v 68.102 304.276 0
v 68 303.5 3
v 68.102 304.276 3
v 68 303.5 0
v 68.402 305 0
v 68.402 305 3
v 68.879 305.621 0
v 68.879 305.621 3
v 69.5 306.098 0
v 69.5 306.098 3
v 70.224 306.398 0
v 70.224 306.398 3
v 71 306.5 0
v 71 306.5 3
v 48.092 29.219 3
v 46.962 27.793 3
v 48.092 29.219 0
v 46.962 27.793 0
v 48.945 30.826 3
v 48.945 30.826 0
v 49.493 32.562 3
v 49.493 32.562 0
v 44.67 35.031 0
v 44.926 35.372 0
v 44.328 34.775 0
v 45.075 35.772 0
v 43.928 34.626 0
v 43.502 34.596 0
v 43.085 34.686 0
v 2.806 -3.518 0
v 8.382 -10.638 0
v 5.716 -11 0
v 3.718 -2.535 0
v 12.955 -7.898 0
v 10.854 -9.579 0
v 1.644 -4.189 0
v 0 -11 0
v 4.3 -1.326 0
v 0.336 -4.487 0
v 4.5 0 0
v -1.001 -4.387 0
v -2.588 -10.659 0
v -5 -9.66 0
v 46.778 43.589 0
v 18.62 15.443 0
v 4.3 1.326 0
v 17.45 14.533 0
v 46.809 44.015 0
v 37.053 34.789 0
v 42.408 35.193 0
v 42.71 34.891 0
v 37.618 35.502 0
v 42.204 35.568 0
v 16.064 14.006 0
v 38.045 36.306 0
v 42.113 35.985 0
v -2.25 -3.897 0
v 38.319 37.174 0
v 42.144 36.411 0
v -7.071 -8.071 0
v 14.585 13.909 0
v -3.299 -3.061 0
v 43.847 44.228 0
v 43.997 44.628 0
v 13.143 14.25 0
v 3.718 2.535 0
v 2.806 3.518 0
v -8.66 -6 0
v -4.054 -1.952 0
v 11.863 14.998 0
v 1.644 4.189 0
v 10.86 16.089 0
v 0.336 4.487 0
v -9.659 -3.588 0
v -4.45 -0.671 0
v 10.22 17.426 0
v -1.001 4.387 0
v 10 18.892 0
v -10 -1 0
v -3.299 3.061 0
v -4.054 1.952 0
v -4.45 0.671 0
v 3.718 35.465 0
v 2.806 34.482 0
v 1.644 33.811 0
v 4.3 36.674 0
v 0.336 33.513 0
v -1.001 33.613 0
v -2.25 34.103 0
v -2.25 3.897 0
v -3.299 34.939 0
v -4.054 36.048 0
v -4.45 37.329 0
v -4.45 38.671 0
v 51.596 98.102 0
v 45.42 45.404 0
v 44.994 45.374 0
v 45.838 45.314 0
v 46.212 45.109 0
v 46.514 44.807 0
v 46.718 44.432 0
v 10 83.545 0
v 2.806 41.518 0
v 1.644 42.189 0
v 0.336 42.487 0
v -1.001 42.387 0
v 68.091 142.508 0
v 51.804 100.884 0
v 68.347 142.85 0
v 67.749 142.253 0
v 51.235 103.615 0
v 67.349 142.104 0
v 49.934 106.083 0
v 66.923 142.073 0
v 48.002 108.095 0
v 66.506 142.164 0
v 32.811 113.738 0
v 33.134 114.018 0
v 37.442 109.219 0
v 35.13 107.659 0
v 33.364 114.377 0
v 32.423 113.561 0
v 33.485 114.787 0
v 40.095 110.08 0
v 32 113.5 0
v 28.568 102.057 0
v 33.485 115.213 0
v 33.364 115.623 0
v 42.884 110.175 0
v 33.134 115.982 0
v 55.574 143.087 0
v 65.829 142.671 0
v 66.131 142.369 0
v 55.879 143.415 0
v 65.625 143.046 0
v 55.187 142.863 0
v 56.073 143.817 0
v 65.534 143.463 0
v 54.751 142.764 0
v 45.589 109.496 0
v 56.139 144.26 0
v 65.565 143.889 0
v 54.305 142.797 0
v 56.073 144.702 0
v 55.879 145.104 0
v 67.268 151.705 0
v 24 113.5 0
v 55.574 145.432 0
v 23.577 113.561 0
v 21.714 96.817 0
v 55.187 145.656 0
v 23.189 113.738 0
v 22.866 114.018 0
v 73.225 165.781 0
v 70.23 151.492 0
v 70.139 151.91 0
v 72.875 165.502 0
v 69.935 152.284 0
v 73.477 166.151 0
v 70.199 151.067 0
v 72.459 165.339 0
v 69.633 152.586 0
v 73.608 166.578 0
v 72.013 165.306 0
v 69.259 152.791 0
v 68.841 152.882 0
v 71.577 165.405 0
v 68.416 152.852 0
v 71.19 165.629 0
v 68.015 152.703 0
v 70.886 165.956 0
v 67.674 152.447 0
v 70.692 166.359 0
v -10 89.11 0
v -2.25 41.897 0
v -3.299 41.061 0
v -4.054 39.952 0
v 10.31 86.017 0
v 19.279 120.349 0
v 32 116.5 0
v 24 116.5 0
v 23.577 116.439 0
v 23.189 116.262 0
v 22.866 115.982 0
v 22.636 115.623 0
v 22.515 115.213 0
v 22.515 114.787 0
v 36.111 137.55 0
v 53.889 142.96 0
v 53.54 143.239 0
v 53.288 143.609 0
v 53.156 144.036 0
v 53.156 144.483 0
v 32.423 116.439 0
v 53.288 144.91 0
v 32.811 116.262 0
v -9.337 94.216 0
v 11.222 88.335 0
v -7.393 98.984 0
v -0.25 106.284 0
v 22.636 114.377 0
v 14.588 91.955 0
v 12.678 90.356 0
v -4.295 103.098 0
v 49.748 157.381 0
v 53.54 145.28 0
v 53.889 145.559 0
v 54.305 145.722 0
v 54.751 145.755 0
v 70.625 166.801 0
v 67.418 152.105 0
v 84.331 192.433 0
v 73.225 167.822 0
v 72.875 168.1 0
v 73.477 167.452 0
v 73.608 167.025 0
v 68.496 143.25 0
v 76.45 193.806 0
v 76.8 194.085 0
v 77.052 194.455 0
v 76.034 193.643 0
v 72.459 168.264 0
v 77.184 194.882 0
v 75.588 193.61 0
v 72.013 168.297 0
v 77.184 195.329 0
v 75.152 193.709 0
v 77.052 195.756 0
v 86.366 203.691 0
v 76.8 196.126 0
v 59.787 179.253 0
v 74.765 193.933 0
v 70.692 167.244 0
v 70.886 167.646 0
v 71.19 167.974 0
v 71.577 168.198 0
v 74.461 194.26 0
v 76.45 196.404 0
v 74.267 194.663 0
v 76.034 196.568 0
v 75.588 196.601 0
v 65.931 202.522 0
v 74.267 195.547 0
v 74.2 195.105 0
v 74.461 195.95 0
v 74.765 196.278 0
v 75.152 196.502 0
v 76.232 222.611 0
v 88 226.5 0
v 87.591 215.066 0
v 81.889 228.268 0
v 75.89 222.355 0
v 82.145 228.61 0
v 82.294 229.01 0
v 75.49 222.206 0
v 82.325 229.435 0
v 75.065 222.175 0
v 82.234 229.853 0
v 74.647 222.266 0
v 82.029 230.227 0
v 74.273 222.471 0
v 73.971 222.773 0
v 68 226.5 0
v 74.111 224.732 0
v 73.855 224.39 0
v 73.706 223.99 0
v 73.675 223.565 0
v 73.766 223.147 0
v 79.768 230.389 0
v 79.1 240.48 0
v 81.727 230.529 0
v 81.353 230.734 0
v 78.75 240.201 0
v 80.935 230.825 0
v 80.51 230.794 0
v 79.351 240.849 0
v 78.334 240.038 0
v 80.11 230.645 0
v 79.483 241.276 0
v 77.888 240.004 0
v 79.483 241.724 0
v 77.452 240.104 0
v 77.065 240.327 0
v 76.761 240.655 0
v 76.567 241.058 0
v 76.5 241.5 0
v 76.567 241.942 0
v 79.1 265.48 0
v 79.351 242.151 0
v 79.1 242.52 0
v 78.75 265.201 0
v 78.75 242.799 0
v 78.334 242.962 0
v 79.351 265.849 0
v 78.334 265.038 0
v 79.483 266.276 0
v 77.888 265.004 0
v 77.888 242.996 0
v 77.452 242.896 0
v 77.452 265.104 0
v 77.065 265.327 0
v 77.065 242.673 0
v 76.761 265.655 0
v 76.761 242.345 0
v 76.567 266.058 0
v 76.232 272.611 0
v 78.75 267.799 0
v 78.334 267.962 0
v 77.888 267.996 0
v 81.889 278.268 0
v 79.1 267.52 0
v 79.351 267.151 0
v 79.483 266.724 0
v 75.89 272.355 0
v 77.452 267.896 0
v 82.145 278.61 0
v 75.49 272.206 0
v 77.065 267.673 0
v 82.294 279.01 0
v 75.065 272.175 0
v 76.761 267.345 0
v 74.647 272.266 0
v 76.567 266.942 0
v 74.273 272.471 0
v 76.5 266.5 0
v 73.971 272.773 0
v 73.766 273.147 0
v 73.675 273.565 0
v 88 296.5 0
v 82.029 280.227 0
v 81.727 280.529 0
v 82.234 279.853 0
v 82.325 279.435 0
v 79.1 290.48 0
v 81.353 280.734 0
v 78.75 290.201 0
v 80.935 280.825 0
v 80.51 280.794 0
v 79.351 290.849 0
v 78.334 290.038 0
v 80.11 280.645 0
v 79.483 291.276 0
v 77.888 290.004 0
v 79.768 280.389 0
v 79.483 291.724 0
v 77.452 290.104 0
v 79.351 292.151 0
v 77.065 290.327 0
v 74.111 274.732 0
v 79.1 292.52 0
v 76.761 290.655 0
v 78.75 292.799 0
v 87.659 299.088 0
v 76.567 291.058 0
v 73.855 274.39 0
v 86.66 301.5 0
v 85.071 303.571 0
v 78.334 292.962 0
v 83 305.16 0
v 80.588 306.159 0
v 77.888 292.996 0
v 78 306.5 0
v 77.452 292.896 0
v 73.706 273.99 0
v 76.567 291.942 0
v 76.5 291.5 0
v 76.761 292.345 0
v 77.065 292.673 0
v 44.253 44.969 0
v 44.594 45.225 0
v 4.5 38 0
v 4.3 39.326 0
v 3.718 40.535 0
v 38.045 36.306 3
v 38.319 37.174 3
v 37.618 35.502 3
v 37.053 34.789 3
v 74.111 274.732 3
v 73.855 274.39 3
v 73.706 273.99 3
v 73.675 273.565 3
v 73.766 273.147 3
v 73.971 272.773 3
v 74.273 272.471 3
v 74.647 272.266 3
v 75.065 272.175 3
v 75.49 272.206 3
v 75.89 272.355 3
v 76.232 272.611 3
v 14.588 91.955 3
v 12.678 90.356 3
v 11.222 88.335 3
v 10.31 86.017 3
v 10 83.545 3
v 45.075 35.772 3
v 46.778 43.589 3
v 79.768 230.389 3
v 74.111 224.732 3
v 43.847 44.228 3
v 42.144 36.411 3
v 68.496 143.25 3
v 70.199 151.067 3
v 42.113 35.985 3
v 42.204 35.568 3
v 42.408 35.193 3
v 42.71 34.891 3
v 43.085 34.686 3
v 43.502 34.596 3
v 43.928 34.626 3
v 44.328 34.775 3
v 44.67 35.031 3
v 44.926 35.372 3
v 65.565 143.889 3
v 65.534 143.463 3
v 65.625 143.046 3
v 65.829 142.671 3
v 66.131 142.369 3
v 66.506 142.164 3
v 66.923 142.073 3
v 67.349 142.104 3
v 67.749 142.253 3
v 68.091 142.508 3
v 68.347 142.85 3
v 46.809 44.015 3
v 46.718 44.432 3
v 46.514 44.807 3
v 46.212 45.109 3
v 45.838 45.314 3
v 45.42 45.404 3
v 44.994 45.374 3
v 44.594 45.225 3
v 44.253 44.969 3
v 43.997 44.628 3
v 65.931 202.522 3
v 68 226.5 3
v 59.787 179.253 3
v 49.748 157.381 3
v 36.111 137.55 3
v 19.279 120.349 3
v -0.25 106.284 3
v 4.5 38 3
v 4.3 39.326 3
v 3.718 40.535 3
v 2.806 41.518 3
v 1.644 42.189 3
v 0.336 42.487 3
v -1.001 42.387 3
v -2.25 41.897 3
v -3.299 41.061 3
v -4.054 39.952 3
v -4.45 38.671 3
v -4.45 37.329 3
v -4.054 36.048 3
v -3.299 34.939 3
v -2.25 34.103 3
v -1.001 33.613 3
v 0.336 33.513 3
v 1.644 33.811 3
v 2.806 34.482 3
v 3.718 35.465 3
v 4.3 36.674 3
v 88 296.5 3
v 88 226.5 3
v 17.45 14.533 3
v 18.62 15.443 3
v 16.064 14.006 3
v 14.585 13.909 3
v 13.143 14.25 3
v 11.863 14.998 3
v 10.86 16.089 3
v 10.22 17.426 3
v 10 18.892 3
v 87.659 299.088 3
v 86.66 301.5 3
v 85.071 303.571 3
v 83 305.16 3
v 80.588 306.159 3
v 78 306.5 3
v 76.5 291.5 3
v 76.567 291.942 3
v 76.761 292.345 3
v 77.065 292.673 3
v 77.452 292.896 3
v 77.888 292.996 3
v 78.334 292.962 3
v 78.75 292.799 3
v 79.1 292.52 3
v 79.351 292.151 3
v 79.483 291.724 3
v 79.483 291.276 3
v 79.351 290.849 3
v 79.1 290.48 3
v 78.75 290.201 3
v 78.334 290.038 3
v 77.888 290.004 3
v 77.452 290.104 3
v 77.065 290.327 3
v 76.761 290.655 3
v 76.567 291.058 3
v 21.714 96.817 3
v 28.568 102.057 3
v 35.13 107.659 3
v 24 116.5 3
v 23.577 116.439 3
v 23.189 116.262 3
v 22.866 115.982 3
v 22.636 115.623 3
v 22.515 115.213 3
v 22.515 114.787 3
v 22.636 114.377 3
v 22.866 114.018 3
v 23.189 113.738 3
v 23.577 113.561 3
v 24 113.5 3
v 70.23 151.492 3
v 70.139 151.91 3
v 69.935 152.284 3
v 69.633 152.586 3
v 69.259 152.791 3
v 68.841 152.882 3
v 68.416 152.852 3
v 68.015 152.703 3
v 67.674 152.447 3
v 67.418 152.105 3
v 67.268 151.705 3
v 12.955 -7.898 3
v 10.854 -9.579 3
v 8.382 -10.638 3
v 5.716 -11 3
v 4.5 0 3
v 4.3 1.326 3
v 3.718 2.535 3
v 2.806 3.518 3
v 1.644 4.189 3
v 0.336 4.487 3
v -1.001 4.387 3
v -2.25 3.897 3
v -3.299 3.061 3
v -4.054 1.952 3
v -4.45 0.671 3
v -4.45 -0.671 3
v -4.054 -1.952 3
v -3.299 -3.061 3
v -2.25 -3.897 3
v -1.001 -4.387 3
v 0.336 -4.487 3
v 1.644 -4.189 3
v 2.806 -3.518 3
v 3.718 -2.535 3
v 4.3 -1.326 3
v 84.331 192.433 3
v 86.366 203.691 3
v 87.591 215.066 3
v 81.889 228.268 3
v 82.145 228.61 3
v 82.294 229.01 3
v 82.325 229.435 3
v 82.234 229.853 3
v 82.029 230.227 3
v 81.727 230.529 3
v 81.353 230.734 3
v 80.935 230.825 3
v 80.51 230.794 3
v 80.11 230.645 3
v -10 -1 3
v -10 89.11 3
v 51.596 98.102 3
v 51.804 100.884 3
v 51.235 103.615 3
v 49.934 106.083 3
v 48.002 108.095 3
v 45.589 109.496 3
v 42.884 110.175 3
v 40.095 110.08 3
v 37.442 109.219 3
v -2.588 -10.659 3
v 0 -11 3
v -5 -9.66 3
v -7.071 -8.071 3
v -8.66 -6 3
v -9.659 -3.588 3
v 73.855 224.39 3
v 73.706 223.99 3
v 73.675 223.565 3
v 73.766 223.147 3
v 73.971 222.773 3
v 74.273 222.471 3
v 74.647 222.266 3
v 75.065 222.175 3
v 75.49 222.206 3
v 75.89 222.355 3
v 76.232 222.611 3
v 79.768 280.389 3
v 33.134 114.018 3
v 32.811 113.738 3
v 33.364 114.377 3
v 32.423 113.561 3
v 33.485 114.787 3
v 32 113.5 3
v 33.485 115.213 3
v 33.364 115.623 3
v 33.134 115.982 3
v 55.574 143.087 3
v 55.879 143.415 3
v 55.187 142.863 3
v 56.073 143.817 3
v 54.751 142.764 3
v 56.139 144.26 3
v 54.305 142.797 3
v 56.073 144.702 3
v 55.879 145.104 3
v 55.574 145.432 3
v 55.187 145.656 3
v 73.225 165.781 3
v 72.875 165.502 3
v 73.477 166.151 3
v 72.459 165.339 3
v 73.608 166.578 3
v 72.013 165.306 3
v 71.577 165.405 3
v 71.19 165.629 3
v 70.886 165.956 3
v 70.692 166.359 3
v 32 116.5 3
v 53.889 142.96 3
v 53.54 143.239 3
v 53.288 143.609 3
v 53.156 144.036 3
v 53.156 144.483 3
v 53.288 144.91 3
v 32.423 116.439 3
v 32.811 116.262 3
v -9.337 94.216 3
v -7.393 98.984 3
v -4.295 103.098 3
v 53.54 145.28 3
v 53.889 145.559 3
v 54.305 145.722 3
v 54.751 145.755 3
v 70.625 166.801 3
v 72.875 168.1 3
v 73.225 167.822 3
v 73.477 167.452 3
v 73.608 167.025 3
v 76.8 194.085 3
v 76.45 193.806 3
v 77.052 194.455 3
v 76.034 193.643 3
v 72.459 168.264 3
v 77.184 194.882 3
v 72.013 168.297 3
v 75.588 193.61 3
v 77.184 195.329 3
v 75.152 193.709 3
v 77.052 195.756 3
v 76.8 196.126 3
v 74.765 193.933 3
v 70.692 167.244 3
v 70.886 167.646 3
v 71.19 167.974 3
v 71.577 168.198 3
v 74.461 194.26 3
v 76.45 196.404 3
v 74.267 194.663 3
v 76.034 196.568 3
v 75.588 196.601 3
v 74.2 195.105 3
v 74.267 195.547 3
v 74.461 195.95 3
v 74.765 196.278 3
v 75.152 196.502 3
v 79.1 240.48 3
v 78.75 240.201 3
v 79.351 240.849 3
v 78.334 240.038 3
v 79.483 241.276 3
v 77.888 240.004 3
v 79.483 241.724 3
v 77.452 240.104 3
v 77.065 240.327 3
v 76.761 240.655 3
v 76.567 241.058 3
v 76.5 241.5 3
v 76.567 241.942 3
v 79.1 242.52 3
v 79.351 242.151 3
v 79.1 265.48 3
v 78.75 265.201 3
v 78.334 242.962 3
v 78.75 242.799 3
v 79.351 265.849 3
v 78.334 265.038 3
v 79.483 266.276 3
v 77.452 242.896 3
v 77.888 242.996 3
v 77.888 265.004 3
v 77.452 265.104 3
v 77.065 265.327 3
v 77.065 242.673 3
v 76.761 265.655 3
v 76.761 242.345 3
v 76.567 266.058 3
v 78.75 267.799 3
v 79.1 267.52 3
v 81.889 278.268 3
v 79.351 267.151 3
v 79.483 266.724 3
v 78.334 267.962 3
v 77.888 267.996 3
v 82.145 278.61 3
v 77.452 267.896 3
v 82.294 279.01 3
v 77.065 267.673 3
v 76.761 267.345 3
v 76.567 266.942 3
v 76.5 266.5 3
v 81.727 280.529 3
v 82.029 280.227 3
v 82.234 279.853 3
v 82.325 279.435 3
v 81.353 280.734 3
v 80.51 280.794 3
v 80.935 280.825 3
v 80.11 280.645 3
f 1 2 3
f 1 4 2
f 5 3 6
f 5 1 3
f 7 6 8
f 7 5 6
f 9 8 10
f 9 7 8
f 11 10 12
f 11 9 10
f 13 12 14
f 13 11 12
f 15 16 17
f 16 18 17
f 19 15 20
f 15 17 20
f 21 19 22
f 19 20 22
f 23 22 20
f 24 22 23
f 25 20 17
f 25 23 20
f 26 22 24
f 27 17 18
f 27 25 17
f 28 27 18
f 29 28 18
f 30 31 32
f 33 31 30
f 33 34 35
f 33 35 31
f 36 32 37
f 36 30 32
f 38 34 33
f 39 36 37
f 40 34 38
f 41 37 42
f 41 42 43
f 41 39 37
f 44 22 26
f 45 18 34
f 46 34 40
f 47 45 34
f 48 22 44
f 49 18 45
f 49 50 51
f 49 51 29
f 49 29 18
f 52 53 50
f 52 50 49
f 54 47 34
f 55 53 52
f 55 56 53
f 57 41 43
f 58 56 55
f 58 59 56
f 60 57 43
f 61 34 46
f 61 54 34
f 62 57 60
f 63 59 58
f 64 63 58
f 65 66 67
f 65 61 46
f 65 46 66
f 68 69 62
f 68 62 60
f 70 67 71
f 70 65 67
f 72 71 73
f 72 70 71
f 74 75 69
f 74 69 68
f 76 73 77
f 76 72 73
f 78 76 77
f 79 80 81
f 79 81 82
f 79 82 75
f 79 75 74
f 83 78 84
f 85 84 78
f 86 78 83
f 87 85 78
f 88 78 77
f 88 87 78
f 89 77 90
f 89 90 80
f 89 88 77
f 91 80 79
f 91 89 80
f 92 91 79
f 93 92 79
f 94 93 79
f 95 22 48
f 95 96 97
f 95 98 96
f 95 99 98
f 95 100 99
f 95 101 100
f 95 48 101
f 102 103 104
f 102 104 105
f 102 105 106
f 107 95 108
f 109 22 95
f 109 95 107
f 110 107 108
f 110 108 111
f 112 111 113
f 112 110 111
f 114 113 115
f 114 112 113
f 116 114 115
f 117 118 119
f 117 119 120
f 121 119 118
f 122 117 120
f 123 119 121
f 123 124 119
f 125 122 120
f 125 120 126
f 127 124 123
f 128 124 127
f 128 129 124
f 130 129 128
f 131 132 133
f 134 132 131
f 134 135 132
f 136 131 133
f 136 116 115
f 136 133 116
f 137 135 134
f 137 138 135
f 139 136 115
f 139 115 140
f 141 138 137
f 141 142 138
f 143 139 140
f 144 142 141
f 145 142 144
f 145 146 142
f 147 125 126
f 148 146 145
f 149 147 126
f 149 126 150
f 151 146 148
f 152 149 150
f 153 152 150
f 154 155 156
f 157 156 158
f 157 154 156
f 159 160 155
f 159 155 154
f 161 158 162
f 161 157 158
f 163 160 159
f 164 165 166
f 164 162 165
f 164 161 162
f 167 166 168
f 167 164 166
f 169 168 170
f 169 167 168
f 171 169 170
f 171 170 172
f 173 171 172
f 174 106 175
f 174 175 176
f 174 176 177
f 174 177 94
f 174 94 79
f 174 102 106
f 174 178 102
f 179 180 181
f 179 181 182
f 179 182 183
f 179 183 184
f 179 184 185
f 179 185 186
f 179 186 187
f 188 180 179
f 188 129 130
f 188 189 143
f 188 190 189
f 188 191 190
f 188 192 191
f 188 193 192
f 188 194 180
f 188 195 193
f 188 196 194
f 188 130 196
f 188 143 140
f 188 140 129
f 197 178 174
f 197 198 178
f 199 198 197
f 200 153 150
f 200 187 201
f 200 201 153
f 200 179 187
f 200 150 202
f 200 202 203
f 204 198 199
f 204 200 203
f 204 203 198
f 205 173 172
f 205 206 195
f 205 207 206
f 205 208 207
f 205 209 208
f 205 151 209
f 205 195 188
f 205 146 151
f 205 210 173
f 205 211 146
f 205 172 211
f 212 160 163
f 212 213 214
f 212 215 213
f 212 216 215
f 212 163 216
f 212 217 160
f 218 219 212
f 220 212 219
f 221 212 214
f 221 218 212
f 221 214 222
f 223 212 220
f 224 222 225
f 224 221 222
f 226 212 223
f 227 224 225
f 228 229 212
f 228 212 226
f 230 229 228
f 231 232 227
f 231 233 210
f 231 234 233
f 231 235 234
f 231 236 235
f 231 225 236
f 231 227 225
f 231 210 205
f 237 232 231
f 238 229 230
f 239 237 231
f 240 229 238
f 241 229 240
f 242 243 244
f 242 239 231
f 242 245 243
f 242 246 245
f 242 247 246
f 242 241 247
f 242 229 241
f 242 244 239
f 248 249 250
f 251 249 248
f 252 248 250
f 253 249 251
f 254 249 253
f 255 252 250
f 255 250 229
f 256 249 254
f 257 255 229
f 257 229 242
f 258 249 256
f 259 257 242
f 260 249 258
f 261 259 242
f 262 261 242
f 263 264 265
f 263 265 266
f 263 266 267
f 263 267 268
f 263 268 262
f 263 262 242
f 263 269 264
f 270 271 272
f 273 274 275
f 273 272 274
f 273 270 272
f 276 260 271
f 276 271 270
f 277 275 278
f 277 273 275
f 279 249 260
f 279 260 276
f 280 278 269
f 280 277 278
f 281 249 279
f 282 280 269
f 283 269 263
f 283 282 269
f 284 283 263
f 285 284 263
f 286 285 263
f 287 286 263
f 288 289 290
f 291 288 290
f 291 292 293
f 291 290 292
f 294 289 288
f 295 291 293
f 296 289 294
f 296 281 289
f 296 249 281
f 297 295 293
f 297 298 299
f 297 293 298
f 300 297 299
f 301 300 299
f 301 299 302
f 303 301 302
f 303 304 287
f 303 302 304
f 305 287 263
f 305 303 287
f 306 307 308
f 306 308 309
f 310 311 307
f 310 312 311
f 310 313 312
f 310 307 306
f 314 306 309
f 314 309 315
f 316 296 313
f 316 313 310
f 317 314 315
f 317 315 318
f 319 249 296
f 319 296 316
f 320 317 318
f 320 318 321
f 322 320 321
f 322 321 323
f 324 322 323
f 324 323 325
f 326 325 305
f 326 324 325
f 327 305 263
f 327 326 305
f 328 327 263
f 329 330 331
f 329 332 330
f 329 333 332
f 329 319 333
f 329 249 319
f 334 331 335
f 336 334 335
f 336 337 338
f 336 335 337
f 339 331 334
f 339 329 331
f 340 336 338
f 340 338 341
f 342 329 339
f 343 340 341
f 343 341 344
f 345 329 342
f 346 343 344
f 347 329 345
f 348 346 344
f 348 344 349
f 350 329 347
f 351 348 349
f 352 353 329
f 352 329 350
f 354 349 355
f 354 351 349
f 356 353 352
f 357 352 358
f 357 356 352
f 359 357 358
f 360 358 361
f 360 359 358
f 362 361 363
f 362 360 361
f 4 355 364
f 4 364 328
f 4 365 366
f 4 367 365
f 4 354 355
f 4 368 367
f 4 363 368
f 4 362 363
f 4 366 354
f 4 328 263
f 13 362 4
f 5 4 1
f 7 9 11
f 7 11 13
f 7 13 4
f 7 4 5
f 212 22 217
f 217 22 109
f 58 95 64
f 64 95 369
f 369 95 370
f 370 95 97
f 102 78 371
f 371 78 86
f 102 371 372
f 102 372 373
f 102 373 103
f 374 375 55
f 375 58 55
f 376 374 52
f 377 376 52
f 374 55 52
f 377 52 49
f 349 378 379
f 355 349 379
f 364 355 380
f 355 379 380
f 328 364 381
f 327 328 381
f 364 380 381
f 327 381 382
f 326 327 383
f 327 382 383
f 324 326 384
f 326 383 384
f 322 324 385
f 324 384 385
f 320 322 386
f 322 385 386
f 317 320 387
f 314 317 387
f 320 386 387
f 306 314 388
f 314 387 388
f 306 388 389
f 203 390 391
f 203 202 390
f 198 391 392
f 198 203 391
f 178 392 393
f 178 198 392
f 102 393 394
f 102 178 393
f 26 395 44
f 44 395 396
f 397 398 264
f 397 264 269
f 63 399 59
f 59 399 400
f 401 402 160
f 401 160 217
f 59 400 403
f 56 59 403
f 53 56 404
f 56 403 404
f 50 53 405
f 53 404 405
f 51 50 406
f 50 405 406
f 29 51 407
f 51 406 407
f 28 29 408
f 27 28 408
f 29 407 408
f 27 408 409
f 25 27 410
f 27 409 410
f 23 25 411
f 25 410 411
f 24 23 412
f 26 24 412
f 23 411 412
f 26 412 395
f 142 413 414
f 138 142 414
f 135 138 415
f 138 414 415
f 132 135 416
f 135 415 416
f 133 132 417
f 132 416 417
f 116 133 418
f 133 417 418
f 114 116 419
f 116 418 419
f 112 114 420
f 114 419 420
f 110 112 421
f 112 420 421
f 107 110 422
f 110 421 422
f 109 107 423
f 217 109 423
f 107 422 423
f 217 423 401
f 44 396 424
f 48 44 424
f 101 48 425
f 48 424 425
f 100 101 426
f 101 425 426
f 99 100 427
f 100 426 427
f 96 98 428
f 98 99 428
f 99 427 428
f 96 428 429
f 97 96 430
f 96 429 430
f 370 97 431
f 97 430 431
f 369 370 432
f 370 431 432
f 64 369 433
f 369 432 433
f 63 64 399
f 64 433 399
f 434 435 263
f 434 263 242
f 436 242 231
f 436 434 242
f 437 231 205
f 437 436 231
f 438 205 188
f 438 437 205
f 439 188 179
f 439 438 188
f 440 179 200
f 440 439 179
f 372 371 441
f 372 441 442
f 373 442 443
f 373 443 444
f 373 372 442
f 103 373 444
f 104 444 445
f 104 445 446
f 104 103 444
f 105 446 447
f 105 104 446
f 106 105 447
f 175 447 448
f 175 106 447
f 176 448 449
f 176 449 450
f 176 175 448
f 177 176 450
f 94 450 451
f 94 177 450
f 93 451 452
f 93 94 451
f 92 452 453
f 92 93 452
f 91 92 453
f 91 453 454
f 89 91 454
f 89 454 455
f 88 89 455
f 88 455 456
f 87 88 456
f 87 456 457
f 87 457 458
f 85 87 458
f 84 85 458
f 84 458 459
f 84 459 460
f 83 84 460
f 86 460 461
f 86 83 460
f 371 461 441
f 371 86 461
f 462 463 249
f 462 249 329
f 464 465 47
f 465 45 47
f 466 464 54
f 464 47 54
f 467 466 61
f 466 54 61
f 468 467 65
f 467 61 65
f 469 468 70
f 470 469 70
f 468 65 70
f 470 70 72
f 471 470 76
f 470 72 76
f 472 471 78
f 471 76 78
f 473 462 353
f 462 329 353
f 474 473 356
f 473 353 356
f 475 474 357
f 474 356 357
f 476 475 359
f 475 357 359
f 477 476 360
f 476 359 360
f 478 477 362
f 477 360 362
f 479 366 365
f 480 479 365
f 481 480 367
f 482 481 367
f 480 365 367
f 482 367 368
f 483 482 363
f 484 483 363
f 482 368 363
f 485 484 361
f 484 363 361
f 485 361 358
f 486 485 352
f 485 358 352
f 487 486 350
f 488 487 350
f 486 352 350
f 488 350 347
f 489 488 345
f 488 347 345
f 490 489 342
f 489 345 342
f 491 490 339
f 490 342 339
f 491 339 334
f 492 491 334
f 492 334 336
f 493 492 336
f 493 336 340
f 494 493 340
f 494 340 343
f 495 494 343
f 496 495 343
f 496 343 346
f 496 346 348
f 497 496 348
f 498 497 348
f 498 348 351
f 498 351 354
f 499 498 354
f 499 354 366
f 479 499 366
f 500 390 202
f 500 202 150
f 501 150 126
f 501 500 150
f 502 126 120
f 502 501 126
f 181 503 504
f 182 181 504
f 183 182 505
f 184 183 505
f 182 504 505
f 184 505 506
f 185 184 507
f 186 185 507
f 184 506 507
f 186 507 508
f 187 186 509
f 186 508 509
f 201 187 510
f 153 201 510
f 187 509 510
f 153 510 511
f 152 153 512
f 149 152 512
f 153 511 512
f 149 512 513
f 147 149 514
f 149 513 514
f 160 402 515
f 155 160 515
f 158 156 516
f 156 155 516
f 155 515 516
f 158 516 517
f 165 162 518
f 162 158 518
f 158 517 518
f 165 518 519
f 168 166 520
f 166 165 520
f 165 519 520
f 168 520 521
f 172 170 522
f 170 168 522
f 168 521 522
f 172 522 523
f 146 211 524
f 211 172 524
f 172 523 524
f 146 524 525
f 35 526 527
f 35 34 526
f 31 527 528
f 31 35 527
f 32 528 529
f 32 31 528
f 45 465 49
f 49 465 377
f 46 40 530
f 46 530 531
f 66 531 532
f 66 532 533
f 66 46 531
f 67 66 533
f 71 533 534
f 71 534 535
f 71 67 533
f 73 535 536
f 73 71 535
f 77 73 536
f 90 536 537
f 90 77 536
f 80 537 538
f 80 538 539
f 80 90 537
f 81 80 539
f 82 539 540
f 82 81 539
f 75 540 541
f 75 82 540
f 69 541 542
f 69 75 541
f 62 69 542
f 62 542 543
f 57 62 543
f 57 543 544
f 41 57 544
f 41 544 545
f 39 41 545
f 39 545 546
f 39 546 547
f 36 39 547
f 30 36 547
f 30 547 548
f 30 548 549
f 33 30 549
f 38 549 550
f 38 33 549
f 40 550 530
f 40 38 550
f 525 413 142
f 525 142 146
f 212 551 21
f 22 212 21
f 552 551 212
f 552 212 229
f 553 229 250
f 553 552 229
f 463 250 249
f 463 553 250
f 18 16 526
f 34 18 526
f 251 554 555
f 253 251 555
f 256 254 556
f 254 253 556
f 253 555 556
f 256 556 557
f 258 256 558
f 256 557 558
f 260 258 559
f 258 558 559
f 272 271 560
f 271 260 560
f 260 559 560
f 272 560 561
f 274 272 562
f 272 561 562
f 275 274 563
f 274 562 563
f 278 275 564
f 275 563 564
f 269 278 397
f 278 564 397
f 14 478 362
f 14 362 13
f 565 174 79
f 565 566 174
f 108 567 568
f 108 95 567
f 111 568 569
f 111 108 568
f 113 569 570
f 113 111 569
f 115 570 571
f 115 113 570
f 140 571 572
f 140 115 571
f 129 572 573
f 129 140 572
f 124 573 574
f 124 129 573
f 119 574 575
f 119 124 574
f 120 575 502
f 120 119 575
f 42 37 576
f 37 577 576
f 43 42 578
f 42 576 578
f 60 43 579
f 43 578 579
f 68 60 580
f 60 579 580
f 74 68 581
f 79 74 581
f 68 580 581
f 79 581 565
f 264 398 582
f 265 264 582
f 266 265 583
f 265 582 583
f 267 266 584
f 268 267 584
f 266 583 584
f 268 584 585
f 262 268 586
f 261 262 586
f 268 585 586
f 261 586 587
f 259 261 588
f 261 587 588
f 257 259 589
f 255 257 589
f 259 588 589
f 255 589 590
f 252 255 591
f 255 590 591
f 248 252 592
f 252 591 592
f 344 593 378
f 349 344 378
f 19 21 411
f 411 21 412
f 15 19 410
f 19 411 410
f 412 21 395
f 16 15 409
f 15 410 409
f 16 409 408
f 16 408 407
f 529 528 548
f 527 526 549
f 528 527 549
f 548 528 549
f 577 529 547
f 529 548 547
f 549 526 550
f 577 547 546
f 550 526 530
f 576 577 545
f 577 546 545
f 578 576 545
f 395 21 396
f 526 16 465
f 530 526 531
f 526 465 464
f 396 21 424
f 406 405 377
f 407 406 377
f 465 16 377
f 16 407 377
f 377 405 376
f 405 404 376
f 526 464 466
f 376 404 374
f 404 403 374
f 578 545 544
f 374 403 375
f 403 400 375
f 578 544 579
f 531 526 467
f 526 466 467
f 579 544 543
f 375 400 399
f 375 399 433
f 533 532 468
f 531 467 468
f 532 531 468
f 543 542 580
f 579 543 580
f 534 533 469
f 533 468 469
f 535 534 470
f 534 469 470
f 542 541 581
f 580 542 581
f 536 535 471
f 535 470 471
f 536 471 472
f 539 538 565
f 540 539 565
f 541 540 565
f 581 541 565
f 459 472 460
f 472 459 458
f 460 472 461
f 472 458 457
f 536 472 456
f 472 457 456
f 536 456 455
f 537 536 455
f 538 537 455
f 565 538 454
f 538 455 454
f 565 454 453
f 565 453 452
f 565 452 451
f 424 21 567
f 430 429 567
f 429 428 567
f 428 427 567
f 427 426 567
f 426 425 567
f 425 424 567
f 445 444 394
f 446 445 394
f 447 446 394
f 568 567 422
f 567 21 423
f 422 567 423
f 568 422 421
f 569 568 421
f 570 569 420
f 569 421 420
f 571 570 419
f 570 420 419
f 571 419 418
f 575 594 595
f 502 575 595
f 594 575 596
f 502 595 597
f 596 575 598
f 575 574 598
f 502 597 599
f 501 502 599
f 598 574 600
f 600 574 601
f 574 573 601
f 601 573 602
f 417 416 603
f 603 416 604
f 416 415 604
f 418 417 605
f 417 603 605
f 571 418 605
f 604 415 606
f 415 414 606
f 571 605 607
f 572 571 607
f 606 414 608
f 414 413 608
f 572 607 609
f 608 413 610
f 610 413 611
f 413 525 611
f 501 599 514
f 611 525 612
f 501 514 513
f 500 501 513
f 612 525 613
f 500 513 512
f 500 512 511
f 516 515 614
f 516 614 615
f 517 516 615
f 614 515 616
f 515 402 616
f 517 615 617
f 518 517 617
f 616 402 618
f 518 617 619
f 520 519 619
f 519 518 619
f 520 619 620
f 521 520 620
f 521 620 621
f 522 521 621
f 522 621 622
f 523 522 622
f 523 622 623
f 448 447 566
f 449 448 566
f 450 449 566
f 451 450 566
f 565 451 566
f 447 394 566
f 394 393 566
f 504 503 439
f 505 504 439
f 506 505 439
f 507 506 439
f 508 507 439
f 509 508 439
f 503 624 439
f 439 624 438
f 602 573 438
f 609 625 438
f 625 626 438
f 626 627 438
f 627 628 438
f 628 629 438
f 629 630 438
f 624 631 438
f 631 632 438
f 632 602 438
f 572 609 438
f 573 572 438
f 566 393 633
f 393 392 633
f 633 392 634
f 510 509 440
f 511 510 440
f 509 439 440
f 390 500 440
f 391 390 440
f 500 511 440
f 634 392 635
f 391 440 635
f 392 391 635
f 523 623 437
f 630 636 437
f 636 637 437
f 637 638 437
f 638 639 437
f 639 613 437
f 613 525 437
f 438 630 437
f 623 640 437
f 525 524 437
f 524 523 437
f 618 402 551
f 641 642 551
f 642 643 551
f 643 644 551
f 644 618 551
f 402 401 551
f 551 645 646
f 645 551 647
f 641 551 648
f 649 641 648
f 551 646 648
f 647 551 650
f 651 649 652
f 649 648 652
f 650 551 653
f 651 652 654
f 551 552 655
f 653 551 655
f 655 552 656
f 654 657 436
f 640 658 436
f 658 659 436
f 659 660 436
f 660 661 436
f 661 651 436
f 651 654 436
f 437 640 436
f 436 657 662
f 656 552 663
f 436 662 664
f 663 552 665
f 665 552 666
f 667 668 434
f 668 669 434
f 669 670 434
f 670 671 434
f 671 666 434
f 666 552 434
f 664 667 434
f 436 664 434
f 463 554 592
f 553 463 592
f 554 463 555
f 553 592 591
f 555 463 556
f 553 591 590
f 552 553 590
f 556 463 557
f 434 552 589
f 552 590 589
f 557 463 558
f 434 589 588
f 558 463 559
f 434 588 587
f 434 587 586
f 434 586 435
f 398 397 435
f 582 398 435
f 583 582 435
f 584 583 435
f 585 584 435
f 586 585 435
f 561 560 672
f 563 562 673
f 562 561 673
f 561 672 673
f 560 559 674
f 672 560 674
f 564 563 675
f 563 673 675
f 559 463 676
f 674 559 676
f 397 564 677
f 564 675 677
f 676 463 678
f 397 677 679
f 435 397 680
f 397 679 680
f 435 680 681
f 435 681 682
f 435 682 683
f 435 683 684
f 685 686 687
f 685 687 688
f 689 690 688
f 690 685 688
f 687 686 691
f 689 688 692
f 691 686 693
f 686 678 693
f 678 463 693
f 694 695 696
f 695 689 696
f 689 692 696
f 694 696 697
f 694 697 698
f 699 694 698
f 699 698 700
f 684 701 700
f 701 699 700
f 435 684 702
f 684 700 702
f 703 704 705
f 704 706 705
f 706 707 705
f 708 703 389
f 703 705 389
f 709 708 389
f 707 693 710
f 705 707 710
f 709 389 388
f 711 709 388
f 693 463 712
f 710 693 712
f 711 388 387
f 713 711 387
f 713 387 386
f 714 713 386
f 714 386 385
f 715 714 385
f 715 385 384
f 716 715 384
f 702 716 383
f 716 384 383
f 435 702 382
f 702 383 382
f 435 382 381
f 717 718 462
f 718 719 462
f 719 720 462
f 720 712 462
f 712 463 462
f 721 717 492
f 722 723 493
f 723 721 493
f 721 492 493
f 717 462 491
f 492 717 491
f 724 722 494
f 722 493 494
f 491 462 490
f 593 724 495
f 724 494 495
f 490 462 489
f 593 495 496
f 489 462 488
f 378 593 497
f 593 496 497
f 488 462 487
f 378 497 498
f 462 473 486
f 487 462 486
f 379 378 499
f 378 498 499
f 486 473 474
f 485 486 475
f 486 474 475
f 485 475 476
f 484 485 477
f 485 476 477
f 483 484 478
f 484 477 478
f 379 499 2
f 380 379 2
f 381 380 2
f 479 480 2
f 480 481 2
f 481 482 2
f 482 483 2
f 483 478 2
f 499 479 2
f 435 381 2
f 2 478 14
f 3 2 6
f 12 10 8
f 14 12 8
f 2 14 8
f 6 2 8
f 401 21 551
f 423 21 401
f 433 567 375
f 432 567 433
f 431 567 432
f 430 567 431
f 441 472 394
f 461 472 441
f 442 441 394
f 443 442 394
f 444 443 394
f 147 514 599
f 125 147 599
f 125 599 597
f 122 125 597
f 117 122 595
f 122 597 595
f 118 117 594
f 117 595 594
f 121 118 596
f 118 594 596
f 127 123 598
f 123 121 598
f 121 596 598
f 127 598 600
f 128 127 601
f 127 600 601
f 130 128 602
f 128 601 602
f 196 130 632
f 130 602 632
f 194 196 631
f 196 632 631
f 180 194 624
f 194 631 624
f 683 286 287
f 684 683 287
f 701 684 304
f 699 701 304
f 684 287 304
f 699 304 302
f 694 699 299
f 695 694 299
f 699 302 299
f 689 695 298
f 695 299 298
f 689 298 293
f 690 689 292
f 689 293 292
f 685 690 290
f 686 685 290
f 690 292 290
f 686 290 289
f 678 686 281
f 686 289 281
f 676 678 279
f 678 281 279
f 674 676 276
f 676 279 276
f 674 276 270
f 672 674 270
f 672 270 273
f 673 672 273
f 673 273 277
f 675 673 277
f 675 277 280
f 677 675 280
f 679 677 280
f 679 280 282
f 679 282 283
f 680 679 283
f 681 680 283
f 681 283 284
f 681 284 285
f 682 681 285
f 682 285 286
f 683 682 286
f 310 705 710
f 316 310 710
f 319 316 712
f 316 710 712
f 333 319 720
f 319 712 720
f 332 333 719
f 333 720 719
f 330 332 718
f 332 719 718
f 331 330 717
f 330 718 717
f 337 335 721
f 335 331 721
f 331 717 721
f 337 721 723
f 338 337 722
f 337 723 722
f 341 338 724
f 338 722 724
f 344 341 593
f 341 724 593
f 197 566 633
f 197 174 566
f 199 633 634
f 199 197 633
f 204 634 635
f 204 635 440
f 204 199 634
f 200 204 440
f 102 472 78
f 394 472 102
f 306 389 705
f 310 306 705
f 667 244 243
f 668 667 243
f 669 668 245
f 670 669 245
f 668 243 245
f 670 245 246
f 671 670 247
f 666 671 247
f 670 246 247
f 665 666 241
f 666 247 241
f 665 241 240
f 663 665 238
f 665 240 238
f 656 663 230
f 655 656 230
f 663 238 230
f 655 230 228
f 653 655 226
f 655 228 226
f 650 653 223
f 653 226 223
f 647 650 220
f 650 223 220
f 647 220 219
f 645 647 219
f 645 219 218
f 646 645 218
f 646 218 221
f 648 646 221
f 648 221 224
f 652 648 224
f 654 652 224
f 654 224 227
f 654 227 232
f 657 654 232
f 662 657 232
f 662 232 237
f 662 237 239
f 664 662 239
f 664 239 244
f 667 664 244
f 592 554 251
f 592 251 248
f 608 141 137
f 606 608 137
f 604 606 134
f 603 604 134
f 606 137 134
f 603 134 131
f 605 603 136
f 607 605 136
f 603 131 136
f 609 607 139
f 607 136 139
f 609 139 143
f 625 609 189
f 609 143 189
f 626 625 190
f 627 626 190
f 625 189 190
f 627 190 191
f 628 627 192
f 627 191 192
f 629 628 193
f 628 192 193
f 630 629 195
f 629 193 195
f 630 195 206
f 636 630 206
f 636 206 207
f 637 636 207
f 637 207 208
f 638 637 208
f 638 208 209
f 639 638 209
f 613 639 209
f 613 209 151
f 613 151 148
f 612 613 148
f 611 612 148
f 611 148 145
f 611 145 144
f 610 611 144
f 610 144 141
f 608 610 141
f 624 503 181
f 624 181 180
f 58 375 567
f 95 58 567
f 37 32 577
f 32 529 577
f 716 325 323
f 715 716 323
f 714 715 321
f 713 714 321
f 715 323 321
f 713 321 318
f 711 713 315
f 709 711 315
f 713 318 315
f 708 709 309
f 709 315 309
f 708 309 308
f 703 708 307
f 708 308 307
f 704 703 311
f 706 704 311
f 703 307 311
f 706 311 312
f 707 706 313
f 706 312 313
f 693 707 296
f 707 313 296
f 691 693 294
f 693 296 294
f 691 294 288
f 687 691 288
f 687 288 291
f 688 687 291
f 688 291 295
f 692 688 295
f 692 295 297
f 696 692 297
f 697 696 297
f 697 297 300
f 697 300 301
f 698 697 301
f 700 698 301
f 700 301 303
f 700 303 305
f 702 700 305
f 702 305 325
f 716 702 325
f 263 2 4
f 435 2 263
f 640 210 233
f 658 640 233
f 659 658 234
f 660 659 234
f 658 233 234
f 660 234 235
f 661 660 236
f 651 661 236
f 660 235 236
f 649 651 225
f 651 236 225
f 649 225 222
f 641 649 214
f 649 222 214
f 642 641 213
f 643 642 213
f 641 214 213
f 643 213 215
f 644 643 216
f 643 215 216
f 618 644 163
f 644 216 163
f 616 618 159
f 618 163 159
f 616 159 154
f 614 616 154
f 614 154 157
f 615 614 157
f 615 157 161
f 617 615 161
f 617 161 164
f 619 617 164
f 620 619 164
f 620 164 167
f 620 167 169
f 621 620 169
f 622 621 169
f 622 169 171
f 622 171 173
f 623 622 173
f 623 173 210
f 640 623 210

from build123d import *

# Parameters (mm, degrees)
SKETCH_1_W          = 20
SKETCH_1_H          = 60
SKETCH_1_R          = 4.5
EXTRUDE_1_DEPTH     = 3
EXTRUDE_2_DEPTH     = 3
EXTRUDE_START       = -3
EXTRUDE_3_DEPTH     = 3
FILLET_2_R          = 10
FILLET_3_R          = 20
FILLET_4_R          = 3
SKETCH_5_W          = 8
SKETCH_5_H          = 3
CUT_EXTRUDE_1_DEPTH = 319.896926922
SKETCH_7_R          = 1.5
CUT_EXTRUDE_2_DEPTH = 319.896926922
CUT_EXTRUDE_4_DEPTH = 10
EXTRUDE_4_DEPTH     = 3
FILLET_5_R          = 10
FILLET_6_R          = 10
FILLET_7_R          = 5
SKETCH_11_R         = 1.5
CUT_EXTRUDE_6_DEPTH = 319.896926922
SKETCH_12_R         = 1.5
CUT_EXTRUDE_7_DEPTH = 319.896926922


with BuildPart() as part:
    # 草图1 → 凸台-拉伸1 (new body)
    with BuildSketch(Plane.XY):
        with Locations((0, 19)):
            Rectangle(SKETCH_1_W, SKETCH_1_H)
        Circle(SKETCH_1_R, mode=Mode.SUBTRACT)
        with Locations((0, 38)):
            Circle(SKETCH_1_R, mode=Mode.SUBTRACT)
    extrude(amount=EXTRUDE_1_DEPTH)

    # 草图3 → 凸台-拉伸2 (add)
    with BuildSketch(Plane.XY.offset(3)):
        with BuildLine():
            Line((-10, 100.977093724), (-10, 79.00084746))
            ThreePointArc((-10, 79.00084746), (0.177205293, 83.704863402), (10, 89.110044035))
            ThreePointArc((10, 89.110044035), (67.140217047, 147.506329367), (88, 226.5))
            ThreePointArc((88, 226.5), (82.919333848, 266.5), (68, 303.959666924))
            Line((68, 303.959666924), (68, 226.5))
            ThreePointArc((68, 226.5), (46.91173197, 152.608187192), (-10, 100.977093724))
        make_face()
        with BuildLine():
            Line((-10, 79.00084746), (-10, 49))
            Line((-10, 49), (10, 49))
            Line((10, 49), (10, 89.110044035))
            ThreePointArc((10, 89.110044035), (0.177205293, 83.704863402), (-10, 79.00084746))
        make_face()
        with BuildLine():
            Line((68, 306.5), (68, 303.959666924))
            ThreePointArc((68, 303.959666924), (82.919333848, 266.5), (88, 226.5))
            Line((88, 226.5), (88, 306.5))
            Line((88, 306.5), (68, 306.5))
        make_face()
    extrude(amount=-EXTRUDE_2_DEPTH)

    # 草图4 → 凸台-拉伸3 (add)
    with BuildSketch(Plane(origin=(0, 0, 0), x_dir=(-1, 0, 0), z_dir=(0, 0, -1)).offset(EXTRUDE_START)):
        with BuildLine():
            Line((-40, -11), (-10, -11))
            Line((-10, -11), (-10, -1))
            Line((-10, -1), (-30, -1))
            Line((-30, -1), (-59.811855282, 135.804714527))
            ThreePointArc((-59.811855282, 135.804714527), (-74.827433124, 162.925595698), (-84.331190721, 192.433024677))
            Line((-84.331190721, 192.433024677), (-40, -11))
        make_face()
    extrude(amount=EXTRUDE_3_DEPTH)

    # 圆角2
    fillet_2_edges = [part.edges().sort_by_distance(p)[0] for p in [
        (88, 306.5, 1.5),
        (40, -11, 1.5),
        (-10, -11, 1.5),
    ]]
    fillet(fillet_2_edges, radius=FILLET_2_R)

    # 圆角3
    fillet_3_edges = [part.edges().sort_by_distance(p)[0] for p in [
        (-10, 100.977093724, 1.5),
    ]]
    fillet(fillet_3_edges, radius=FILLET_3_R)

    # 圆角4
    fillet_4_edges = [part.edges().sort_by_distance(p)[0] for p in [
        (68, 306.5, 1.5),
    ]]
    fillet(fillet_4_edges, radius=FILLET_4_R)

    # 草图5 → 切除-拉伸1 (cut, through all)
    with BuildSketch(Plane.XY.offset(3)):
        Polygon((46.77842194, 43.588901874), (43.847212114, 44.227657662), (42.143863348, 36.411098126), (45.075073174, 35.772342338), align=None)
        Polygon((70.199467474, 151.066595495), (68.496118708, 143.250035959), (65.564908882, 143.888791747), (67.268257648, 151.705351283), align=None)
        with Locations((28, 115)):
            Rectangle(SKETCH_5_W, SKETCH_5_H)
        Polygon((79.767766953, 280.389087297), (74.110912703, 274.732233047), (76.232233047, 272.610912703), (81.889087297, 278.267766953), align=None)
        Polygon((79.767766953, 230.389087297), (81.889087297, 228.267766953), (76.232233047, 222.610912703), (74.110912703, 224.732233047), align=None)
    extrude(amount=-CUT_EXTRUDE_1_DEPTH, mode=Mode.SUBTRACT)

    # 草图7 → 切除-拉伸2 (cut, through all)
    with BuildSketch(Plane(origin=(0, 0, 0), x_dir=(-1, 0, 0), z_dir=(0, 0, -1))):
        with Locations((-72.125207072, 166.801384551)):
            Circle(SKETCH_7_R)
        with Locations((-75.700287711, 195.105334687)):
            Circle(SKETCH_7_R)
        with Locations(Location((-54.63925576, 144.259505713, 0), (0, 0, 180))):
            Circle(SKETCH_7_R)
    extrude(amount=-CUT_EXTRUDE_2_DEPTH, mode=Mode.SUBTRACT)

    # 草图8 → 切除-拉伸4 (cut)
    with BuildSketch(Plane.XY.offset(3)):
        Polygon((37.268809589, 32.356106534), (48.895829905, 29.822399649), (39.17112789, -58.646231881), (10, -11), (10, -1), align=None)
    extrude(amount=-CUT_EXTRUDE_4_DEPTH, mode=Mode.SUBTRACT)

    # 草图9 → 凸台-拉伸4 (add)
    with BuildSketch(Plane.XY.offset(3)):
        Polygon((48.895829905, 29.822399649), (10, -11), (10, -0.039068456), (10, 6.39592954), (38.020150061, 35.803960345), (37.268809589, 32.356106534), align=None)
    extrude(amount=-EXTRUDE_4_DEPTH)

    # 圆角5
    fillet_5_edges = [part.edges().sort_by_distance(p)[0] for p in [
        (10, -11, 1.5),
        (48.895829905, 29.822399649, 1.5),
    ]]
    fillet(fillet_5_edges, radius=FILLET_5_R)

    # 圆角6
    fillet_6_edges = [part.edges().sort_by_distance(p)[0] for p in [
        (10, 89.110044035, 1.5),
        (59.811855282, 135.804714527, 1.5),
    ]]
    fillet(fillet_6_edges, radius=FILLET_6_R)

    # 圆角7
    fillet_7_edges = [part.edges().sort_by_distance(p)[0] for p in [
        (10, 6.39592954, 1.5),
        (38.020150061, 35.803960345, 1.5),
    ]]
    fillet(fillet_7_edges, radius=FILLET_7_R)

    # 草图11 → 切除-拉伸6 (cut, through all)
    with BuildSketch(Plane.XY.offset(3)):
        with Locations((24, 115)):
            Circle(SKETCH_11_R)
        with Locations((32, 115)):
            Circle(SKETCH_11_R)
        with Locations((43.609468261, 36.091720232)):
            Circle(SKETCH_11_R)
        with Locations((45.312817027, 43.908279768)):
            Circle(SKETCH_11_R)
        with Locations((67.030513795, 143.569413853)):
            Circle(SKETCH_11_R)
        with Locations((68.733862561, 151.385973389)):
            Circle(SKETCH_11_R)
        with Locations((80.828427125, 229.328427125)):
            Circle(SKETCH_11_R)
        with Locations((75.171572875, 223.671572875)):
            Circle(SKETCH_11_R)
        with Locations((80.828427125, 279.328427125)):
            Circle(SKETCH_11_R)
        with Locations((75.171572875, 273.671572875)):
            Circle(SKETCH_11_R)
    extrude(amount=-CUT_EXTRUDE_6_DEPTH, mode=Mode.SUBTRACT)

    # 草图12 → 切除-拉伸7 (cut, through all)
    with BuildSketch(Plane(origin=(0, 0, 0), x_dir=(-1, 0, 0), z_dir=(0, 0, -1))):
        with Locations((-78, 291.5)):
            Circle(SKETCH_12_R)
        with Locations((-78, 266.5)):
            Circle(SKETCH_12_R)
        with Locations((-78, 241.5)):
            Circle(SKETCH_12_R)
    extrude(amount=-CUT_EXTRUDE_7_DEPTH, mode=Mode.SUBTRACT)


solid = part.part
